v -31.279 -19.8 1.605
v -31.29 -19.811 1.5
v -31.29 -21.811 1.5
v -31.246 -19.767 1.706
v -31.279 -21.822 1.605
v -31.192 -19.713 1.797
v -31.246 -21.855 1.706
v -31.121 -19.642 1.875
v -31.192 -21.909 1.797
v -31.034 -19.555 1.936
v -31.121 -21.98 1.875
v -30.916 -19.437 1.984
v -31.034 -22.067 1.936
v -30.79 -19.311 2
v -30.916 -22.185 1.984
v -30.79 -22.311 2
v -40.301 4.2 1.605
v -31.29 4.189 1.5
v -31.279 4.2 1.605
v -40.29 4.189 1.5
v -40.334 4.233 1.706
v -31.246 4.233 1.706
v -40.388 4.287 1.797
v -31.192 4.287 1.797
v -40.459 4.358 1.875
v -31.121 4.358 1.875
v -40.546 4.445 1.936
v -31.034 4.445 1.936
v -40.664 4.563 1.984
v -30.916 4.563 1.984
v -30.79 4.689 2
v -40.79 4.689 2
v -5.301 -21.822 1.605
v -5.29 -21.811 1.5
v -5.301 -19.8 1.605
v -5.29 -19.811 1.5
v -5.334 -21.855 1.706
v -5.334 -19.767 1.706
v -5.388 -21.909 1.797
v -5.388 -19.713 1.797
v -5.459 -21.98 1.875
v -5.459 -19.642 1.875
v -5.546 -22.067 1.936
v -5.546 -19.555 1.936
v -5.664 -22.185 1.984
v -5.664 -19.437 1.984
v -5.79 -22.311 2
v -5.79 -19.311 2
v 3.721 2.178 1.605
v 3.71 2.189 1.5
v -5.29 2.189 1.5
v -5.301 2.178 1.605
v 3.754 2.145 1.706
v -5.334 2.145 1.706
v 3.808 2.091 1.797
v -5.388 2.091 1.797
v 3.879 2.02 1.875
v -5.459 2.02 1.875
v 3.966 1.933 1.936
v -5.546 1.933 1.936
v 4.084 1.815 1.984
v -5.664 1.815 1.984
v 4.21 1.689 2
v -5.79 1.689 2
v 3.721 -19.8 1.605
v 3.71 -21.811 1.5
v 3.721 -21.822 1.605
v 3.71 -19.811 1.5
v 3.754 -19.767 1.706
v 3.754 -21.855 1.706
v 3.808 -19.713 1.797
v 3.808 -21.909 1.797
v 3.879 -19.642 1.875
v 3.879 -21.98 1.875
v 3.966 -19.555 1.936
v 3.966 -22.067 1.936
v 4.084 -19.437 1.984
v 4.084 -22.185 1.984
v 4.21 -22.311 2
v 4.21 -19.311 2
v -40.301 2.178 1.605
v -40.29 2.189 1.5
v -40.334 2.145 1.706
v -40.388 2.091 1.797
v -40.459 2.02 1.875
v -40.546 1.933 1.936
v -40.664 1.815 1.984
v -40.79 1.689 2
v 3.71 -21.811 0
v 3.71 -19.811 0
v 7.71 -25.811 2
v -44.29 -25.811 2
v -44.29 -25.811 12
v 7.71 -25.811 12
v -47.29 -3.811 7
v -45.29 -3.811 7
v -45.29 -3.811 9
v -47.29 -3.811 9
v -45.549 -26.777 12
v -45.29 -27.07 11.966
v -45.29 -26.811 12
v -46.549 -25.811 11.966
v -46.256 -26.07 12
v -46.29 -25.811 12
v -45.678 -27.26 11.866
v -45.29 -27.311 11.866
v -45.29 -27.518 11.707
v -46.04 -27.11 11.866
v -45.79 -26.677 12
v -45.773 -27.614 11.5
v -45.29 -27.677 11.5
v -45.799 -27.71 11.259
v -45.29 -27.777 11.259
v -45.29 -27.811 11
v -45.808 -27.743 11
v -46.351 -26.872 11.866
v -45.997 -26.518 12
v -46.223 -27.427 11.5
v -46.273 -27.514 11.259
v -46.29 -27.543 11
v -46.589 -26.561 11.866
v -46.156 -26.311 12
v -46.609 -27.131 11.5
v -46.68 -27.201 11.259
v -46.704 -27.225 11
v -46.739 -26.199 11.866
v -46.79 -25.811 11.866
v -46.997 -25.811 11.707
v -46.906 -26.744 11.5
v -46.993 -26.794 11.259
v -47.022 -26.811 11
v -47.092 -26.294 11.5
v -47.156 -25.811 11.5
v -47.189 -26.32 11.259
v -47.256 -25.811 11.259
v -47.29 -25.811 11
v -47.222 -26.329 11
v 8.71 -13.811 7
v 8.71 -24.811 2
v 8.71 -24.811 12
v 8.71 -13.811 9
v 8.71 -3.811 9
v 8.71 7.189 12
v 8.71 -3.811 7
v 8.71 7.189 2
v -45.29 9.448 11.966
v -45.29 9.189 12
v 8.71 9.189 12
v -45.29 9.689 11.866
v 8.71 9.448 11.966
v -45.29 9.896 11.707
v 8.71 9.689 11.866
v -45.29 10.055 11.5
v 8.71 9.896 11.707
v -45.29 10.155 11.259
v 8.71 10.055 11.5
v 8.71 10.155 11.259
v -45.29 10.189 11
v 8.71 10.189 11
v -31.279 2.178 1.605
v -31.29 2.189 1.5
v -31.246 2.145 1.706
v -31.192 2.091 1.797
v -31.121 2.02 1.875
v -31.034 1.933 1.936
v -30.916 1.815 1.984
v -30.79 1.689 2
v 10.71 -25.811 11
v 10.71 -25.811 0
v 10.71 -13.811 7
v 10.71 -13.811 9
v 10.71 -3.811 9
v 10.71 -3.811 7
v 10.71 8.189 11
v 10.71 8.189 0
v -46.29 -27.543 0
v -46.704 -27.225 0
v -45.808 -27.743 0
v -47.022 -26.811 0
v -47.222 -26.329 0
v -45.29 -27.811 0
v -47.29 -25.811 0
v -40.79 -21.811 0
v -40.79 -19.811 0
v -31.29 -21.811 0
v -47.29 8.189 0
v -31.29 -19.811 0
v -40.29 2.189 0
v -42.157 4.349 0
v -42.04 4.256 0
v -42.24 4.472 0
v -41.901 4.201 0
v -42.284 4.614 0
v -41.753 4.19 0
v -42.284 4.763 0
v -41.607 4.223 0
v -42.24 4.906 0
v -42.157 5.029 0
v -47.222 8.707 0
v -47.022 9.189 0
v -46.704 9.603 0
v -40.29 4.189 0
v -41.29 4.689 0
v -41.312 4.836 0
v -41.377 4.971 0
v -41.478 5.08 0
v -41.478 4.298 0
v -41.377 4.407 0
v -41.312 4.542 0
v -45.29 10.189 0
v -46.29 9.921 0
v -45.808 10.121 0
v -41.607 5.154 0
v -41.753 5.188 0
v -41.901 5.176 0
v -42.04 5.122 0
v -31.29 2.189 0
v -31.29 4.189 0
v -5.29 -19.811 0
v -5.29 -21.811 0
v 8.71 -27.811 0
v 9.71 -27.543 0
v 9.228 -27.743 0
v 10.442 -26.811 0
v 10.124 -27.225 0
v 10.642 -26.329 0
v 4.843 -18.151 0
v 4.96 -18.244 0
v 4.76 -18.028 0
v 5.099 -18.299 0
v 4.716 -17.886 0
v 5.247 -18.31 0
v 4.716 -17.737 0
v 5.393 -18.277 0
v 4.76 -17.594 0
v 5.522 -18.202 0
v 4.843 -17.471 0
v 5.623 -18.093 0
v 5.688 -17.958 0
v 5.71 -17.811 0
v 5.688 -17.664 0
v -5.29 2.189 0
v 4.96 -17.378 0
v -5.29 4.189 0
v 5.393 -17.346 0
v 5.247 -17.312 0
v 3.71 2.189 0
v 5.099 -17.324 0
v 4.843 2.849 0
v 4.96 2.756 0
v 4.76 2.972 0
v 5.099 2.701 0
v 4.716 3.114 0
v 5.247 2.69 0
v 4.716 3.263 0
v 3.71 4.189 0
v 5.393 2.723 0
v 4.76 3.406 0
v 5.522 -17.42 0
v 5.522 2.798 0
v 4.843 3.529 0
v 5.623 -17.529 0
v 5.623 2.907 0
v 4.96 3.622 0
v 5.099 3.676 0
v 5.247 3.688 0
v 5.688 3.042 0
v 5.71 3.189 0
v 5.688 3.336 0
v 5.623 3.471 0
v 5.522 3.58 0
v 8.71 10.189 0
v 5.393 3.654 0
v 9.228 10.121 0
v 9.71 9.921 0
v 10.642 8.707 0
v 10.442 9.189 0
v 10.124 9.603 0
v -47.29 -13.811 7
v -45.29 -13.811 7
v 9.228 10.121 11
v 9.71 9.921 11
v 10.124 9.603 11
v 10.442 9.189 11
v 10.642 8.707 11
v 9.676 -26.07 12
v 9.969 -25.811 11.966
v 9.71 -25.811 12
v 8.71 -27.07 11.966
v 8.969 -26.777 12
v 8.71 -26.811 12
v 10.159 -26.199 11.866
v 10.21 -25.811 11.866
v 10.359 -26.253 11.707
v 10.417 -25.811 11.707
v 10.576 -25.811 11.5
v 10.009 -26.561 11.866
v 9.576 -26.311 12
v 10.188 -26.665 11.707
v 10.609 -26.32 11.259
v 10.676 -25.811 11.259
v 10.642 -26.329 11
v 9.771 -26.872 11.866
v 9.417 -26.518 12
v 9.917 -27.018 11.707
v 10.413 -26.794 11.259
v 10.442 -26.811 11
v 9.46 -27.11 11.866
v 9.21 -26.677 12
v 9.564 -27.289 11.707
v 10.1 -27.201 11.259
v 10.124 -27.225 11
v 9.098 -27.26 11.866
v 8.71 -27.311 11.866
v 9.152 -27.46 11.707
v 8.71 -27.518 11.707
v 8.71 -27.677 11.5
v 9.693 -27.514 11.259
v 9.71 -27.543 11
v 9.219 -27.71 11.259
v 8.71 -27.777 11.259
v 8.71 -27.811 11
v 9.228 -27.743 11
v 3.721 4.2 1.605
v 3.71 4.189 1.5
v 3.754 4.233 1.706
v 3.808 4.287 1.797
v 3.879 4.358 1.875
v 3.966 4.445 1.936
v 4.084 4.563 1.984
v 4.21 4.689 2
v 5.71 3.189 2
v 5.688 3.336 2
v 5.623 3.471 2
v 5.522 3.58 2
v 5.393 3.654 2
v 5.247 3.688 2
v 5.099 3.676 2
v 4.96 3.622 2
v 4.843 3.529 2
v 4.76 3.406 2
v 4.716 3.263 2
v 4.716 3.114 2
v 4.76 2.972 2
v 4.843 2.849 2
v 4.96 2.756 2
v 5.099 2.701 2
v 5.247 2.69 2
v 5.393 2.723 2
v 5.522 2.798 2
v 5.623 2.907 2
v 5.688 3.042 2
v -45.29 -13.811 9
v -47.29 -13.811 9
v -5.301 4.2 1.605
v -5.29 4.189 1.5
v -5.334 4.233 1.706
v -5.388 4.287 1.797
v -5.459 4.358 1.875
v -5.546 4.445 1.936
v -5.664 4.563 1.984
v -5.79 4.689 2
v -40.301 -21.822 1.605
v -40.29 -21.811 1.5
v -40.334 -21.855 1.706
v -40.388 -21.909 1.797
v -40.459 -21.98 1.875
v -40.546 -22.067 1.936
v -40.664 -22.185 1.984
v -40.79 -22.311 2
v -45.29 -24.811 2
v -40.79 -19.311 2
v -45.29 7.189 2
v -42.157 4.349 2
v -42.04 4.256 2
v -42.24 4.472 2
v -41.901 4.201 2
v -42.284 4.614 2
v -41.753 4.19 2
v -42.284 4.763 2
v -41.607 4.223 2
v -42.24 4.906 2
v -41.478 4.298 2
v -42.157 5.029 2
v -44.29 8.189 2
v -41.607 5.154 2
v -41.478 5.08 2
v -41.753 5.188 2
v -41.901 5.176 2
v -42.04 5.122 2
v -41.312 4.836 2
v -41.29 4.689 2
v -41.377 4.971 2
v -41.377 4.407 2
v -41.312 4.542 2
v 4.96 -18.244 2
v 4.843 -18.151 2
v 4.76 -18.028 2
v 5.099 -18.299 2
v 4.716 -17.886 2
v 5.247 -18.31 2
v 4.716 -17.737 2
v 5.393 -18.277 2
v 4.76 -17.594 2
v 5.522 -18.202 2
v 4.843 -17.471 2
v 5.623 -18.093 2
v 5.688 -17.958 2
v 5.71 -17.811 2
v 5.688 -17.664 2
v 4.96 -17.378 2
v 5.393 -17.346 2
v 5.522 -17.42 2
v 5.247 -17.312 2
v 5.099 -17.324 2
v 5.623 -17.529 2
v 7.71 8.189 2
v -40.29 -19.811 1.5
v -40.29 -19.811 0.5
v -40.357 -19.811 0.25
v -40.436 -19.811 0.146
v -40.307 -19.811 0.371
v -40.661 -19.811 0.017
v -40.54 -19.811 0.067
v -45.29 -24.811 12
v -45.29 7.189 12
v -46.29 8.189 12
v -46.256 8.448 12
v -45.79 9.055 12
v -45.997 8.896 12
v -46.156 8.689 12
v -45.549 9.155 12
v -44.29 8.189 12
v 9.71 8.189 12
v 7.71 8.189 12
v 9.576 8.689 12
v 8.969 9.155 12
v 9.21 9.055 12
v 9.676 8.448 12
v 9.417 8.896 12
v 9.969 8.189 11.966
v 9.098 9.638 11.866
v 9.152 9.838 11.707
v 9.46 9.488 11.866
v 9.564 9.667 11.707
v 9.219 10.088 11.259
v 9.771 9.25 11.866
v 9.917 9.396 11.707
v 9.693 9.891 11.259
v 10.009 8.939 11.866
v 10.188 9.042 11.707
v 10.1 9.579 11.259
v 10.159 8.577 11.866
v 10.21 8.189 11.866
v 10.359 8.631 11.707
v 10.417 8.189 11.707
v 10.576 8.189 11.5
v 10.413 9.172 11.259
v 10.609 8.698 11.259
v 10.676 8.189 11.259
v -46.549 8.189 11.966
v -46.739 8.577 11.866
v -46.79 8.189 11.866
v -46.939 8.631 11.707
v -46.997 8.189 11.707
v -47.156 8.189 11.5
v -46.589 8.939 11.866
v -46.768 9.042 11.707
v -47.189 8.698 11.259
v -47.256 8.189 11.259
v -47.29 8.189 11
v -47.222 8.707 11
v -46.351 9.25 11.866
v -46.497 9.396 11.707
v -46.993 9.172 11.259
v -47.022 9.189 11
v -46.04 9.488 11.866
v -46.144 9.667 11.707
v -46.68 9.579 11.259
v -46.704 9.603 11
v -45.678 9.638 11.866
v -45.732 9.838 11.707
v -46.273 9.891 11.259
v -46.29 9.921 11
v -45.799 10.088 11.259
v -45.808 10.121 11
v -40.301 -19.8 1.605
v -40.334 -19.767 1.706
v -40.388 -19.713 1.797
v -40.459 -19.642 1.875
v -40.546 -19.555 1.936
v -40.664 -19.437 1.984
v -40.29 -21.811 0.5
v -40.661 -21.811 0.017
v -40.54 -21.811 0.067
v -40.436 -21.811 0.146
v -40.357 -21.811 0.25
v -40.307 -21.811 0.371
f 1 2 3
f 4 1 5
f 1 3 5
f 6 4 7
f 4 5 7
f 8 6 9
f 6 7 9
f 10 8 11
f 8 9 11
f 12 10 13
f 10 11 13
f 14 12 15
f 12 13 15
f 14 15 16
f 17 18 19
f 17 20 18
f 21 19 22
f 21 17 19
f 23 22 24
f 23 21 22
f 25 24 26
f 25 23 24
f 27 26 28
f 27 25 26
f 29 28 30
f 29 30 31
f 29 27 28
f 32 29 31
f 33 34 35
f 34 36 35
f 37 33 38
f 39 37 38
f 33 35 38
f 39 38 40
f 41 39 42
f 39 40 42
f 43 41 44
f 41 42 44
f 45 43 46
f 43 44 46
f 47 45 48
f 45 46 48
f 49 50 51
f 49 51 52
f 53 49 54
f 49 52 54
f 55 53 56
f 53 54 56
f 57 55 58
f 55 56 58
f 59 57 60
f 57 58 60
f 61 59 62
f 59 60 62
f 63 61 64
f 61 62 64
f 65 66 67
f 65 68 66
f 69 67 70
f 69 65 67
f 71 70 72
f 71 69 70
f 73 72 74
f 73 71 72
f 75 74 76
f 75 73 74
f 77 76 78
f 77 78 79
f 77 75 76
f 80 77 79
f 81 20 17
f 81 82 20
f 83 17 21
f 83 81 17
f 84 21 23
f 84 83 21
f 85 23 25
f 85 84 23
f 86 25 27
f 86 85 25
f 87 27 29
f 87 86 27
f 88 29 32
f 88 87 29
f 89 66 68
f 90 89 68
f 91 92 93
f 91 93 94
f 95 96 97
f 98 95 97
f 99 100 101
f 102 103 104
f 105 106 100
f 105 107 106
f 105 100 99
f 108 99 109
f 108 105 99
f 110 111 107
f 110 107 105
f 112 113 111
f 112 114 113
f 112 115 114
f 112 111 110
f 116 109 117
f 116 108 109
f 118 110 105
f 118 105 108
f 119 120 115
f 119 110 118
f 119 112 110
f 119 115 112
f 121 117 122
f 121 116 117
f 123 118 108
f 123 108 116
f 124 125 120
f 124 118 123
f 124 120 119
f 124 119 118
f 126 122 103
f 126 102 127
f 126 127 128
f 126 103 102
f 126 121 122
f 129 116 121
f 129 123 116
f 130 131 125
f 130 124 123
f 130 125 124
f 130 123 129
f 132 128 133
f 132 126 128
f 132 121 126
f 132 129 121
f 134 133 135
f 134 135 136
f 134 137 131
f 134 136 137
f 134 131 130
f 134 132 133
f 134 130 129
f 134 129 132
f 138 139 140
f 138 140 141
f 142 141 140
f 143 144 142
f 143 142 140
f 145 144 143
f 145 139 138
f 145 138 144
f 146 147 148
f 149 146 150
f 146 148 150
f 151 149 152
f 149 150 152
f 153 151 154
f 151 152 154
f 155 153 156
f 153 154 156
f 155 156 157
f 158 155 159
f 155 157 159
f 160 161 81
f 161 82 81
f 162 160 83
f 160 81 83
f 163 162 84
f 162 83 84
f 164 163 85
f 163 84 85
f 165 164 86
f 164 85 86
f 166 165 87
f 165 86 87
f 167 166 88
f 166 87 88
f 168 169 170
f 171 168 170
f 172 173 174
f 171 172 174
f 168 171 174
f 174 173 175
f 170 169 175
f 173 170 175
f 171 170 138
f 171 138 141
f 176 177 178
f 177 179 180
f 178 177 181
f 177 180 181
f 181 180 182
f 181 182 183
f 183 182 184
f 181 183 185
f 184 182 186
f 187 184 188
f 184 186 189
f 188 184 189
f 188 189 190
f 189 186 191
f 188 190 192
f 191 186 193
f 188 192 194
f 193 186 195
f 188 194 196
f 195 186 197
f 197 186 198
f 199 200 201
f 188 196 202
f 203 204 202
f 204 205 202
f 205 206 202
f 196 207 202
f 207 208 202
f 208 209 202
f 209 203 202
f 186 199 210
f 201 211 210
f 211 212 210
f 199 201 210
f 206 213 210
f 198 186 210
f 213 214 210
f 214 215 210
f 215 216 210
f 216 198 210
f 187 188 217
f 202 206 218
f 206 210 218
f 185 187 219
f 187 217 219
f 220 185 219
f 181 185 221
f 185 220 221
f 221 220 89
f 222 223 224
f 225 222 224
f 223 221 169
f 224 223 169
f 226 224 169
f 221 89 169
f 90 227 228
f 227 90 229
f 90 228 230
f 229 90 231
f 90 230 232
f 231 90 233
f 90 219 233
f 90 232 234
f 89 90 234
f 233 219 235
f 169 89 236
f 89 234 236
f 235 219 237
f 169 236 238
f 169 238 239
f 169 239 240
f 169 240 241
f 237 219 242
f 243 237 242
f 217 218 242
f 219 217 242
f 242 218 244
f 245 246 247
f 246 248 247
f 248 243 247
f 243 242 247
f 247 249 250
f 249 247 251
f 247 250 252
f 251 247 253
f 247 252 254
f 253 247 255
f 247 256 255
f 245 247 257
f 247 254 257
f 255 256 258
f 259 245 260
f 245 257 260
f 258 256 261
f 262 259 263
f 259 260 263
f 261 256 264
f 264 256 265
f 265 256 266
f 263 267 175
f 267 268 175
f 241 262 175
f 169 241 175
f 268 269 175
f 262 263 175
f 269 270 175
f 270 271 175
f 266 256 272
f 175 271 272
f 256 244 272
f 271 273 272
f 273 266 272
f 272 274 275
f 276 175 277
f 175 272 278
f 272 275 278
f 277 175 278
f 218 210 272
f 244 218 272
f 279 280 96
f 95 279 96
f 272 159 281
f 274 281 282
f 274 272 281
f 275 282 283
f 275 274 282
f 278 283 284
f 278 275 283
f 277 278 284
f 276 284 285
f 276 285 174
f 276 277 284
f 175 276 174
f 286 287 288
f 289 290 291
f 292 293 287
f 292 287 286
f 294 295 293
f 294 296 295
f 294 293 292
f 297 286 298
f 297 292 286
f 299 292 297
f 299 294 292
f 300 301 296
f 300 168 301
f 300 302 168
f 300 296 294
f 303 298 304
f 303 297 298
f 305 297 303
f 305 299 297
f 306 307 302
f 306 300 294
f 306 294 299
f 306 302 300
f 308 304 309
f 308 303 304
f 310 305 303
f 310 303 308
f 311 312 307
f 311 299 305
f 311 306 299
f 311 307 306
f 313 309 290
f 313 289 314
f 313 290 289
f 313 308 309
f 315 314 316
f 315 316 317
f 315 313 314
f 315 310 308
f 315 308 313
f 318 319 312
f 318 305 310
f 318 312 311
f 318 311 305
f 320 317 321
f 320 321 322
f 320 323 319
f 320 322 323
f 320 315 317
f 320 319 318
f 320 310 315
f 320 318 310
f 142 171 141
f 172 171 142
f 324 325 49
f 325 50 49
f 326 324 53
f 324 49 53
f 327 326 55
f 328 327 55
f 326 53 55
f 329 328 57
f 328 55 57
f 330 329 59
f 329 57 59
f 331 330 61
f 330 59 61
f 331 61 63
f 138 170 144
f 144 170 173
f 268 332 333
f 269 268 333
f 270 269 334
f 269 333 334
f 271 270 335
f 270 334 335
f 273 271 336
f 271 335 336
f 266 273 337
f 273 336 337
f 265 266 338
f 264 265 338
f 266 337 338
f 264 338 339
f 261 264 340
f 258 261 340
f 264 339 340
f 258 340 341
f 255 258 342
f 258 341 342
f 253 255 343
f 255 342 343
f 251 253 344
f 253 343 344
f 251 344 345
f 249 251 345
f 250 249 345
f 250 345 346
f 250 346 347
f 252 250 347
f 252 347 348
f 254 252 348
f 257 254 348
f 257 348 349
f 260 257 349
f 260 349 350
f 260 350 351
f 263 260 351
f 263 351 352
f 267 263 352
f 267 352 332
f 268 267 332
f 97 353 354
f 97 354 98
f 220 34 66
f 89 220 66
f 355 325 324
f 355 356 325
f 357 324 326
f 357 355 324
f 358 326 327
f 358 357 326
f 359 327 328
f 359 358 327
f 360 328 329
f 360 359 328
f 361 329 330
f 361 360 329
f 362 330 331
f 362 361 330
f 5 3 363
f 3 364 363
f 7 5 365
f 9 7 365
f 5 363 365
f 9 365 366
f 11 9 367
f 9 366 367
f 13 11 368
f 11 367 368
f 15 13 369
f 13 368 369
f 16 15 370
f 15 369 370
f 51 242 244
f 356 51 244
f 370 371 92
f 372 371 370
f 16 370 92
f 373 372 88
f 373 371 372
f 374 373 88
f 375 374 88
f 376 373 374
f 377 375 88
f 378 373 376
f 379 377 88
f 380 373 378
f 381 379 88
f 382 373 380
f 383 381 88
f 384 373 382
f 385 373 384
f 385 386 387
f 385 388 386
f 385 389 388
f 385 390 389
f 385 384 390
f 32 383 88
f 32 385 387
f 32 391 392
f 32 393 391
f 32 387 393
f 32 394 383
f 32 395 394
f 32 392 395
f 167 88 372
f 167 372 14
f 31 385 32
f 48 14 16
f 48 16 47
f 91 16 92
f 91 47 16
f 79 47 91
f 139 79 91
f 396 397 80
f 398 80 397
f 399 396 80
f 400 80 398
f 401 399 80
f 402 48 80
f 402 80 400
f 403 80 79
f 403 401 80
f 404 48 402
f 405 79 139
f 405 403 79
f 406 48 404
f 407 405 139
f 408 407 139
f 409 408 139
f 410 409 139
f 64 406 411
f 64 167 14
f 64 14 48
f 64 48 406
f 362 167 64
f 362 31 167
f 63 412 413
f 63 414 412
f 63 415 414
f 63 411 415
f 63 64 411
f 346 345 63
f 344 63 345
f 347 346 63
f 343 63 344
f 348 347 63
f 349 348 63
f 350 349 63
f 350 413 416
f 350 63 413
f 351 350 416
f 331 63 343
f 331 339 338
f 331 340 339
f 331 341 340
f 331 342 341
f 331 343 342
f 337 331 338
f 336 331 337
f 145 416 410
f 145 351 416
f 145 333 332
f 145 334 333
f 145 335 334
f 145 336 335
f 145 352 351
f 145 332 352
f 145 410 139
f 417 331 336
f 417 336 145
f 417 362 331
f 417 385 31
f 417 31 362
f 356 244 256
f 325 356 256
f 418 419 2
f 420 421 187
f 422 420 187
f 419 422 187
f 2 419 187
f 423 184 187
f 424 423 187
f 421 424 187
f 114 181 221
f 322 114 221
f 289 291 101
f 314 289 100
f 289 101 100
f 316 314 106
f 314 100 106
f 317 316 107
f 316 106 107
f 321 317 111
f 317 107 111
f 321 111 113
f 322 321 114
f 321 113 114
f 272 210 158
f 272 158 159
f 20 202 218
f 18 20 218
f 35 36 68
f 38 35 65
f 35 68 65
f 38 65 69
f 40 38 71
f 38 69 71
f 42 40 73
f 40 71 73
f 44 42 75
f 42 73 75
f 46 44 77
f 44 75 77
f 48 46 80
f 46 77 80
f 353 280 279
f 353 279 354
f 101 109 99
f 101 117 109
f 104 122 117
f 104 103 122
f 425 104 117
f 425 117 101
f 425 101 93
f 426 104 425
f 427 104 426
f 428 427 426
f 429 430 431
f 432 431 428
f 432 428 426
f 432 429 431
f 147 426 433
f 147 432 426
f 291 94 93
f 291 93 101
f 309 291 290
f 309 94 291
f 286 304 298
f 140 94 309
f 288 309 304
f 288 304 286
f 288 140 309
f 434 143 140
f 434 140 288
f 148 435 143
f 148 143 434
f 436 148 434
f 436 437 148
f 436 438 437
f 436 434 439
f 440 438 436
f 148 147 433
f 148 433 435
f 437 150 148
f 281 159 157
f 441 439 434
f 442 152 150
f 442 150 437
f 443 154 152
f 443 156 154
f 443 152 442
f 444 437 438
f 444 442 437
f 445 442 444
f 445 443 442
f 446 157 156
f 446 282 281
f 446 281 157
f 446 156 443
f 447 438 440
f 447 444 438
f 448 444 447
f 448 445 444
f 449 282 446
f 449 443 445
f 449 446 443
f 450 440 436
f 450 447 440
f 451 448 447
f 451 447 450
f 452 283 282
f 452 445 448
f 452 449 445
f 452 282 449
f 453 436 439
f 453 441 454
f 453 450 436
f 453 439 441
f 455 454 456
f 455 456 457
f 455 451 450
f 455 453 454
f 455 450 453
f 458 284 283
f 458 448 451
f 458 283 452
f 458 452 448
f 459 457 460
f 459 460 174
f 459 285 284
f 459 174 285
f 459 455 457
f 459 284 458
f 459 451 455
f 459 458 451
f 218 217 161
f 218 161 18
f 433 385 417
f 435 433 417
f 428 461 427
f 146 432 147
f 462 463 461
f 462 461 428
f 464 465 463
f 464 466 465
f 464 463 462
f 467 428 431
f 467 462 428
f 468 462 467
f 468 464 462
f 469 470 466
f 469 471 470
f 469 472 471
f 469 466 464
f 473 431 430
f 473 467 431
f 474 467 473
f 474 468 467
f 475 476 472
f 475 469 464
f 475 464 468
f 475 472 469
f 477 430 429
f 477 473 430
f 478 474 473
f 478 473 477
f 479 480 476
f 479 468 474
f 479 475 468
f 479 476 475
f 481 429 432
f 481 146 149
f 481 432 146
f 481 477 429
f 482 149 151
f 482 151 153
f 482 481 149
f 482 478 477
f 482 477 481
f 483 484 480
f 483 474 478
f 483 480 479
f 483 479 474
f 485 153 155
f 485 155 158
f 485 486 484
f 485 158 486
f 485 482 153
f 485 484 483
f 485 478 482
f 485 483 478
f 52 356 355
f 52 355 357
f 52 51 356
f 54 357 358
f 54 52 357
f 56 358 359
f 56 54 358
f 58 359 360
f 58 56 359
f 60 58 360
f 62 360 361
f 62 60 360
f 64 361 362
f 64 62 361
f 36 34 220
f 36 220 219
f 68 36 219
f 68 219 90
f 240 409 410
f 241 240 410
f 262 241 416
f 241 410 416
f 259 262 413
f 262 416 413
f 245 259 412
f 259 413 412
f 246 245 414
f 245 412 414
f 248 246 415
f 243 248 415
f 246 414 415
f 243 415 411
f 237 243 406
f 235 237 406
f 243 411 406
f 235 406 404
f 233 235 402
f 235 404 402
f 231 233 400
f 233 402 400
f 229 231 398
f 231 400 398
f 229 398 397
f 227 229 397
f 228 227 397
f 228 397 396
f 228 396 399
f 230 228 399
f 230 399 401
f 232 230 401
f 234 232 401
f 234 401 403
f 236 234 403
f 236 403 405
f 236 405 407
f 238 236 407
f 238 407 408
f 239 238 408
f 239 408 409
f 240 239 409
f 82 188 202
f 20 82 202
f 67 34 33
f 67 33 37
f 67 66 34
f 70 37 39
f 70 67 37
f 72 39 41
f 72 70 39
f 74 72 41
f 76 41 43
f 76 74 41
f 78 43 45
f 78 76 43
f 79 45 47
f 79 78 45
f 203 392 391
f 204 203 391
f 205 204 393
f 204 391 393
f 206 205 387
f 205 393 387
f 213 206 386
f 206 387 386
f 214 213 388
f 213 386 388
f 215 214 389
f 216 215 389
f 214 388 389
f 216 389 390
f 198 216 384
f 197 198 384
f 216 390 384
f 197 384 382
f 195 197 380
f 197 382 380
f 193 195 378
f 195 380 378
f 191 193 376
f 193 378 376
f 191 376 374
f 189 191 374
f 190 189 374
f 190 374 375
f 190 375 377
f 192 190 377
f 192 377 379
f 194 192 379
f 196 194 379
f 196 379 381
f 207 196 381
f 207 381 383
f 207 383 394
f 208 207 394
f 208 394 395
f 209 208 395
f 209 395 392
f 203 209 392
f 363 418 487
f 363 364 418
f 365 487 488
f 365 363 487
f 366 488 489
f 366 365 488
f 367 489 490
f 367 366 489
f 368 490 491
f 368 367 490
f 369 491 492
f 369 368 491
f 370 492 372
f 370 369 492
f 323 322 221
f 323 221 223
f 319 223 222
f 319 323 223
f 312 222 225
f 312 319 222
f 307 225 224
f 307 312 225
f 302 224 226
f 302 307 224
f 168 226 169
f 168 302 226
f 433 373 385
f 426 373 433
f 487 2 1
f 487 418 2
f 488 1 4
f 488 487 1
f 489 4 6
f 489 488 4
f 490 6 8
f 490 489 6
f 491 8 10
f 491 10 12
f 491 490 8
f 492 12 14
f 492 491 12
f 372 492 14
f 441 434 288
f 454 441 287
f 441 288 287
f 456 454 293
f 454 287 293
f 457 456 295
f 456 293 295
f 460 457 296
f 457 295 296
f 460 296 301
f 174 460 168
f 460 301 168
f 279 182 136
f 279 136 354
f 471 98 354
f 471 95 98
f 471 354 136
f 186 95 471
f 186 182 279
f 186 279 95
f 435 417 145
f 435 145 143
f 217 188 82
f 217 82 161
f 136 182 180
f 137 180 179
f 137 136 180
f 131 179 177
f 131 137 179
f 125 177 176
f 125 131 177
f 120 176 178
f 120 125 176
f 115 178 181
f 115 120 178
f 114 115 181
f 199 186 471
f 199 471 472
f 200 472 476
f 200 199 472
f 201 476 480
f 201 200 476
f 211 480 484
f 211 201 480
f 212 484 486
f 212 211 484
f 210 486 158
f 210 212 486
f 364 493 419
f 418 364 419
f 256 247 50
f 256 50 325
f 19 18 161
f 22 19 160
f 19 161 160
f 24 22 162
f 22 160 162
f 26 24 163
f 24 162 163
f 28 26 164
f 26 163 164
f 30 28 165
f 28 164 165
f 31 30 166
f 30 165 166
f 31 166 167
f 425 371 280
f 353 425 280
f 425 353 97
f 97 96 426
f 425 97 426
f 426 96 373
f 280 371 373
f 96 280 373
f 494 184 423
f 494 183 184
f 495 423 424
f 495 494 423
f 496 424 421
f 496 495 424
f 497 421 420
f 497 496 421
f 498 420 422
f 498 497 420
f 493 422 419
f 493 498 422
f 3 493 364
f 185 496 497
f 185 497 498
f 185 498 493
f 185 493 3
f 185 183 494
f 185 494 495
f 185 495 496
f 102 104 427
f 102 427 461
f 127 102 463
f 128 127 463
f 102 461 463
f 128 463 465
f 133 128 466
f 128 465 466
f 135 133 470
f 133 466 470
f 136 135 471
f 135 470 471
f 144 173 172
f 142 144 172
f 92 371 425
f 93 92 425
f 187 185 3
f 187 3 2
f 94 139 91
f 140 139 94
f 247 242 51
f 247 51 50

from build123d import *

# Parameters (mm, degrees)
F0_W      = 58
F0_H      = 38
F1_DEPTH  = 2
F2_W      = 58
F2_H      = 38
F2_W_2    = 54
F2_H_2    = 34
F3_DEPTH  = 10
F5_W      = 9
F5_H      = 2
F6_DEPTH  = 12.5
F7_R      = 2
F8_R      = 0.5
F9_R      = 1
F10_W     = 10
F10_H     = 2
F11_DEPTH = 58.0010001
F12_SIZE  = 1
F14_R     = 0.5
F15_DEPTH = 25


with BuildPart() as f1:
    # F0 (on Top) → F1 (new body)
    with BuildSketch(Plane.XY):
        with Locations((-18.2900002897, -8.8110647003)):
            Rectangle(F0_W, F0_H)
    extrude(amount=F1_DEPTH)

    # F2 (on face) → F3 (join)
    with BuildSketch(Plane.XY.offset(2)):
        with Locations((-18.2900002897, -8.8110647003)):
            Rectangle(F2_W, F2_H)
        with Locations((-18.2900002897, -8.8110647003)):
            Rectangle(F2_W_2, F2_H_2, mode=Mode.SUBTRACT)
    extrude(amount=F3_DEPTH)

    # F5 (on Top) → F6 (cut, symmetric)
    with BuildSketch(Plane.XY):
        with Locations((-35.7900002897, -20.8110647003)):
            Rectangle(F5_W, F5_H)
        with Locations((-35.7900002897, 3.1889352997)):
            Rectangle(F5_W, F5_H)
        with Locations((-0.7900002897, 3.1889352997)):
            Rectangle(F5_W, F5_H)
        with Locations((-0.7900002897, -20.8110647003)):
            Rectangle(F5_W, F5_H)
    extrude(amount=F6_DEPTH, both=True, mode=Mode.SUBTRACT)

    # F7
    f7_edges = [f1.edges().sort_by_distance(p)[0] for p in [
        (-47.29, -27.811065, 6),
        (10.71, -27.811065, 6),
        (10.71, 10.188935, 6),
        (-47.29, 10.188935, 6),
    ]]
    fillet(f7_edges, radius=F7_R)

    # F8
    f8_edges = [f1.edges().sort_by_distance(p)[0] for p in [
        (-0.79, 2.188935, 2),
        (-0.79, 4.188935, 2),
        (3.71, 3.188935, 2),
        (-5.29, 3.188935, 2),
        (-35.79, 2.188935, 2),
        (-35.79, 4.188935, 2),
        (-31.29, 3.188935, 2),
        (-40.29, 3.188935, 2),
        (-35.79, -19.811065, 2),
        (-35.79, -21.811065, 2),
        (-40.29, -20.811065, 0),
        (-31.29, -20.811065, 2),
        (-40.29, -20.811065, 2),
        (-0.79, -21.811065, 2),
        (-0.79, -19.811065, 2),
        (-5.29, -20.811065, 2),
        (3.71, -20.811065, 2),
    ]]
    fillet(f8_edges, radius=F8_R)

    # F9
    f9_edges = [f1.edges().sort_by_distance(p)[0] for p in [
        (-47.29, -8.811065, 12),
        (-18.29, -27.811065, 12),
        (10.71, -8.811065, 12),
        (-18.29, 10.188935, 12),
        (10.124213, 9.603149, 12),
        (-46.704214, 9.603149, 12),
        (10.124213, -27.225278, 12),
        (-46.704214, -27.225278, 12),
    ]]
    fillet(f9_edges, radius=F9_R)

    # F10 (on face) → F11 (cut, through all)
    with BuildSketch(Plane.YZ.offset(10.7099997103)):
        with Locations((-8.8110647003, 8)):
            Rectangle(F10_W, F10_H)
    extrude(amount=-F11_DEPTH, mode=Mode.SUBTRACT)

    # F12
    f12_edges = [f1.edges().sort_by_distance(p)[0] for p in [
        (-45.29, 8.188935, 7),
        (8.71, 8.188935, 7),
        (-45.29, -25.811065, 7),
        (8.71, -25.811065, 7),
    ]]
    chamfer(f12_edges, length=F12_SIZE)

    # F14 (on face) → F15 (cut)
    with BuildSketch(Plane.XY.offset(2)):
        with Locations((-41.7900002897, 4.6889352997)):
            Circle(F14_R)
        with Locations((5.2099997103, 3.1889352997)):
            Circle(F14_R)
        with Locations((5.2099997103, -17.8110647003)):
            Circle(F14_R)
    extrude(amount=-F15_DEPTH, mode=Mode.SUBTRACT)


solid = f1.part
